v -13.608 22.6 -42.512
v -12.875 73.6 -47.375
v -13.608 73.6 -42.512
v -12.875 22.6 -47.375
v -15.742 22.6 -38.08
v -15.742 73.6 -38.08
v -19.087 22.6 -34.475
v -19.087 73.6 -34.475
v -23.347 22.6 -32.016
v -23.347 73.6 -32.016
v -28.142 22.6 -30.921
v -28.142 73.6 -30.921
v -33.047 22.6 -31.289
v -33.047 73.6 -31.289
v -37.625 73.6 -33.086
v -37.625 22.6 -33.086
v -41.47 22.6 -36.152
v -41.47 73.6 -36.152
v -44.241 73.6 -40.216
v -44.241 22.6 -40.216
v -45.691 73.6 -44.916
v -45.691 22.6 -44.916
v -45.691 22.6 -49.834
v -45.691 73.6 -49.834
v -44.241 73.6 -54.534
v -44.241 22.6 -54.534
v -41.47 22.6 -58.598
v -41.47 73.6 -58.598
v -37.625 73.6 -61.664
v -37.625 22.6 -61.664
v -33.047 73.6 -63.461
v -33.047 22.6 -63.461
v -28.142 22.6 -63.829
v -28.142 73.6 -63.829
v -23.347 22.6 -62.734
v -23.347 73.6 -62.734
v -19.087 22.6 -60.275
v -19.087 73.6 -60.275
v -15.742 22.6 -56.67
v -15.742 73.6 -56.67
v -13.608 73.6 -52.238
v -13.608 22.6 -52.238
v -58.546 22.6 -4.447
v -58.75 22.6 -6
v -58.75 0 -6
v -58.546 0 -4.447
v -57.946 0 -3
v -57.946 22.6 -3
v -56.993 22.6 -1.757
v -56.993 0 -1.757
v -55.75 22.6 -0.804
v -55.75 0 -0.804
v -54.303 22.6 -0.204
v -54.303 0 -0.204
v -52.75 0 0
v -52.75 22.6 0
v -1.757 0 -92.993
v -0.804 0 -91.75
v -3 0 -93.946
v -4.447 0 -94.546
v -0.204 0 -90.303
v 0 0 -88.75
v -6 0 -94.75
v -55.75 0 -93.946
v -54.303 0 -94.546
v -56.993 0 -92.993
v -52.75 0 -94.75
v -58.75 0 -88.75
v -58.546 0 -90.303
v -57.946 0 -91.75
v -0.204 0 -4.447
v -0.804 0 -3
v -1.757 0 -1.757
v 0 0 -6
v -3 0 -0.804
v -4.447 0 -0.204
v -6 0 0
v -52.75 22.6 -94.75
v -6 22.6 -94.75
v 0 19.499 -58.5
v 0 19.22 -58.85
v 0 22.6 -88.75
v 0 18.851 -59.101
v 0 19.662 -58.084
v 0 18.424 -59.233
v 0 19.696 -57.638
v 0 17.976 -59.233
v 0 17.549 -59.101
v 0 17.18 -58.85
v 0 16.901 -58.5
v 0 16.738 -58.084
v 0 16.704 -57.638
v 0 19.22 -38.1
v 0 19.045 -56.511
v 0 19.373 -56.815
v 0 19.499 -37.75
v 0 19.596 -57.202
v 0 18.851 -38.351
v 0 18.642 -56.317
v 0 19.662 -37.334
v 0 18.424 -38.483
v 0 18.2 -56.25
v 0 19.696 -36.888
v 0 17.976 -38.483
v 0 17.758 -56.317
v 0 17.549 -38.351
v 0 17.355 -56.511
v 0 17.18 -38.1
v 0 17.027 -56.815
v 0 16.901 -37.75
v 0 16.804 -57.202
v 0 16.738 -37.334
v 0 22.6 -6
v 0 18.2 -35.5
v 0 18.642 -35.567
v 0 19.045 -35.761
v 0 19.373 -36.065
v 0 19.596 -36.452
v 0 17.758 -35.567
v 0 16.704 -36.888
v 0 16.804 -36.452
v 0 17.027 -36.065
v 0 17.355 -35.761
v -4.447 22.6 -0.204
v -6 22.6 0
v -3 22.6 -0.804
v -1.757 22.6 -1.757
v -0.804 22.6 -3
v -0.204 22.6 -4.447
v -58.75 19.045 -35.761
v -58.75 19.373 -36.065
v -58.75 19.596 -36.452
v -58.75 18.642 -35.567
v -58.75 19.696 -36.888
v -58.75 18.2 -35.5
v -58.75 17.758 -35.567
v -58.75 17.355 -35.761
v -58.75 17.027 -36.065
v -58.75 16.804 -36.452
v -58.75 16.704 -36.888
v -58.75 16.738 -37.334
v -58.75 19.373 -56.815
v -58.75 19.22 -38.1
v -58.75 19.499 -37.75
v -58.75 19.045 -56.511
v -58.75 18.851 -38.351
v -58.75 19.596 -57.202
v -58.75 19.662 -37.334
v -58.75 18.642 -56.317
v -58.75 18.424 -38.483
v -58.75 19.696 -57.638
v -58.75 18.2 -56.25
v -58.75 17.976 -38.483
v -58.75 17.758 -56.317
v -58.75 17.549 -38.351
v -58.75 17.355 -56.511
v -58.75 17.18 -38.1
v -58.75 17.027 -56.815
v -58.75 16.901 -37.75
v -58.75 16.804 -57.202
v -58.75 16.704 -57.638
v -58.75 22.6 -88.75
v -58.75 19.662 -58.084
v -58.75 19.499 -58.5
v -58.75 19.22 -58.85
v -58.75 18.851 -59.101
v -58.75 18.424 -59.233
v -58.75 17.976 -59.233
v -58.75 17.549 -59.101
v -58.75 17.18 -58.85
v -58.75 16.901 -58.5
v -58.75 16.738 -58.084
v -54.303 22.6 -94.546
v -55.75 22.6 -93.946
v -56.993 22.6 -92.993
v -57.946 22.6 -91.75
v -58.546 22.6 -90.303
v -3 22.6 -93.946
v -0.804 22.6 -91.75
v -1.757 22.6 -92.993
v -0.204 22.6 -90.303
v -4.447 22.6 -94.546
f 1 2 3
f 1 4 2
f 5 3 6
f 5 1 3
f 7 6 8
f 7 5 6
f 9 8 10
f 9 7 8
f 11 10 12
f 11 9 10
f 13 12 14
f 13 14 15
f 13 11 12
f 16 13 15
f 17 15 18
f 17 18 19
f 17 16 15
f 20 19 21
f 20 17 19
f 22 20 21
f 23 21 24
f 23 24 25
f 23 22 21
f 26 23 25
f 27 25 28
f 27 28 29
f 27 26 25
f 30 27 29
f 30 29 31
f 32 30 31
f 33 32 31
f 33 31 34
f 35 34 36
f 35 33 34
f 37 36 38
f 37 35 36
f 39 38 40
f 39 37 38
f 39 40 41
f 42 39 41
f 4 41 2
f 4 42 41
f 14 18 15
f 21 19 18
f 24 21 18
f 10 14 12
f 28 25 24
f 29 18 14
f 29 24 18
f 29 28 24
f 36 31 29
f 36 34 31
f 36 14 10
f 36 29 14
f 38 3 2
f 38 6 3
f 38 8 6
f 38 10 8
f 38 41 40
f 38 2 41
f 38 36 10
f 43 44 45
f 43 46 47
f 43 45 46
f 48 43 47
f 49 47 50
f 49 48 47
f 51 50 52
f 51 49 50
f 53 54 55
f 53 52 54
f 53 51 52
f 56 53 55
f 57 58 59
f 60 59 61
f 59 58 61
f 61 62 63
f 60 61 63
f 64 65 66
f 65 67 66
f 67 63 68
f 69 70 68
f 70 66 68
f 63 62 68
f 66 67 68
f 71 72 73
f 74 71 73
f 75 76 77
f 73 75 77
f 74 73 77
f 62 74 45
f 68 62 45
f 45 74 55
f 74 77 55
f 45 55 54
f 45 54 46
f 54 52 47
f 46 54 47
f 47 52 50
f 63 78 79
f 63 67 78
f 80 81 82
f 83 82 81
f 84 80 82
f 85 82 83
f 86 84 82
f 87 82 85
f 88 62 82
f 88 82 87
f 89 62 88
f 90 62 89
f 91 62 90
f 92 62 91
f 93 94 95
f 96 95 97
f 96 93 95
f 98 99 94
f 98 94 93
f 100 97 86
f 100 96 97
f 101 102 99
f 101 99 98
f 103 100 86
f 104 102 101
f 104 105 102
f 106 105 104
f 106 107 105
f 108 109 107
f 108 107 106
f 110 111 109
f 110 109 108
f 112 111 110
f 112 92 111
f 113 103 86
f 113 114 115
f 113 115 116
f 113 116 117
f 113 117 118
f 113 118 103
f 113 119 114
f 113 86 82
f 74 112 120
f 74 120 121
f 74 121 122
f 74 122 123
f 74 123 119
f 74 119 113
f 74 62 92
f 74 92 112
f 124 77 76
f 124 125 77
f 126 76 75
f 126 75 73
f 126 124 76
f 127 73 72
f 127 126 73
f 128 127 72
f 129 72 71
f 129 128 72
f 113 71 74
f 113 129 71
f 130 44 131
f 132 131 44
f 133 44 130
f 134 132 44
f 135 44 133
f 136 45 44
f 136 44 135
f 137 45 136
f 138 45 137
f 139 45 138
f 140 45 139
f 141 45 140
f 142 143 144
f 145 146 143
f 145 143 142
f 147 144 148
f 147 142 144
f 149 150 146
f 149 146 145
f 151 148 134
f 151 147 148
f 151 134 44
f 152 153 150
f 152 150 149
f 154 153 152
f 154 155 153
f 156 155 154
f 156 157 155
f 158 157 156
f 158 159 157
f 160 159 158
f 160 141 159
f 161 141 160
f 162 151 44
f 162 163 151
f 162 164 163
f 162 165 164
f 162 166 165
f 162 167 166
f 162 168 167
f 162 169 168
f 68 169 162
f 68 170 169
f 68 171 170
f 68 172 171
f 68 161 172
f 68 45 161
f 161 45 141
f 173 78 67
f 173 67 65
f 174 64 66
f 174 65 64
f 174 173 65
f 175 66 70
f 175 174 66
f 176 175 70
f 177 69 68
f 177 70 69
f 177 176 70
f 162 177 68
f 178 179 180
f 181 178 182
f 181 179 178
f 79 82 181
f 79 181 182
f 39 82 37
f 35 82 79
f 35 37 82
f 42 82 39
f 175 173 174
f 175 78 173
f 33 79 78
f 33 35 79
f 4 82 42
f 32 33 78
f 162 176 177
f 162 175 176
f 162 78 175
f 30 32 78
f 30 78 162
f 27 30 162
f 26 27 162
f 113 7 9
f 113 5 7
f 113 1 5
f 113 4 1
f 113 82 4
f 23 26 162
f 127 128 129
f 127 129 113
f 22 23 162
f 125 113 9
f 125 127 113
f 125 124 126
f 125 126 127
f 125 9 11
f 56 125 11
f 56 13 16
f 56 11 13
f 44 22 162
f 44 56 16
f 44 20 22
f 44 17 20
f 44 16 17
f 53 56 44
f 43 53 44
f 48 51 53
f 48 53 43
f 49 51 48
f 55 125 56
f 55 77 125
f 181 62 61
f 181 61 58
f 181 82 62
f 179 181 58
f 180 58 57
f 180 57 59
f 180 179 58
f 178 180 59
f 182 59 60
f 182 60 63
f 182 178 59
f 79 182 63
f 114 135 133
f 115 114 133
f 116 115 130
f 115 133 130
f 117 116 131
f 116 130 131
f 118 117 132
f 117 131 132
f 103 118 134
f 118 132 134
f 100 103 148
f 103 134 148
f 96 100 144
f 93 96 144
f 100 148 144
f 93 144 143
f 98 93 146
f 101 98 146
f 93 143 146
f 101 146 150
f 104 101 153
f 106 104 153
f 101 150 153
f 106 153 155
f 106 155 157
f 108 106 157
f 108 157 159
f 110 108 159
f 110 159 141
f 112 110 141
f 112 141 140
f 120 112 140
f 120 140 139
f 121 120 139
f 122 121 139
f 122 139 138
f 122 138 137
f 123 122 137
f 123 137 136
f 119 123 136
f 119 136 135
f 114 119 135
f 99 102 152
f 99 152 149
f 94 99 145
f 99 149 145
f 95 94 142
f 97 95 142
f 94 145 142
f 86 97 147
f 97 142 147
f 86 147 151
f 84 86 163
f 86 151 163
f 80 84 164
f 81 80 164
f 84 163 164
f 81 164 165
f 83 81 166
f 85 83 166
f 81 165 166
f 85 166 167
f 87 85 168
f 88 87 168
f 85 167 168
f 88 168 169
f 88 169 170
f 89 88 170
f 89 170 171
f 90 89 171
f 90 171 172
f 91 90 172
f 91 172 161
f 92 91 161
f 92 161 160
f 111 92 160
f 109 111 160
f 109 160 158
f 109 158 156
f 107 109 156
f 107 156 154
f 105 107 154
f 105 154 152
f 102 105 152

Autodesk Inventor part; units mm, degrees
ref_plane "YZ Plane" through (0, 0, 0) normal (1, 0, 0) x (0, 1, 0)
ref_plane "XZ Plane" through (0, 0, 0) normal (0, 1, 0) x (-1, 0, 0)
ref_plane "XY Plane" through (0, 0, 0) normal (0, 0, 1) x (1, 0, 0)
sketch "Sketch1" plane through (0, 0, 0) normal (0, 1, 0) x (-1, 0, 0)
  line L0 (0, 0) -> (58.75, 0)
  line L1 (58.75, 0) -> (58.75, -94.75)
  line L2 (58.75, -94.75) -> (0, -94.75)
  line L3 (0, -94.75) -> (0, 0)
  dimension "d0" = 58.75
  dimension "d1" = 94.75
extrude "Extrusion1" add sketch "Sketch1" along normal blind 22.6
sketch "Sketch2" plane through (0, 22.6, 0) normal (0, 1, 0) x (1, 0, 0)
  line L0 (-58.75, 0) -> (0, 0) projected
  line L1 (-29.375, 0) -> (-29.375, 94.75)
  line L2 (0, 94.75) -> (-58.75, 94.75) projected
  line L3 (-58.75, 94.75) -> (-58.75, 0) projected
  line L4 (-58.75, 47.375) -> (0, 47.375)
  line L5 (0, 0) -> (0, 94.75) projected
  circle A0 centre (-29.375, 47.375) radius 16.5
  dimension "d4" = 33
extrude "Extrusion2" add sketch "Sketch2" along normal blind 51 contours A0 L4 L1 | L1 L4 A0 | A0 L1 L4 | L1 A0 L4
fillet "Fillet1" radius 6 4 edges at (0, 11.3, 0) (0, 11.3, -94.75) (-58.75, 11.3, 0) (-58.75, 11.3, -94.75)
sketch "Sketch3" plane through (-58.75, 0, -88.75) normal (-1, 0, 0) x (0, 0, 1)
  line L0 (82.75, 22.6) -> (88.75, 22.6) projected
  line L1 (88.75, 22.6) -> (51.75, 22.6)
  line L2 (24.875, 22.6) -> (57.875, 22.6) projected
  line L3 (51.75, 22.6) -> (51.75, 18.2)
  circle A0 centre (51.75, 18.2) radius 1.5
  line L4 (41.375, 22.6) -> (41.375, 4.2655)
  circle A1 centre (31, 18.2) radius 1.5
  point P0 (88.75, 0)
  dimension "d8" = 37
  dimension "d9" = 4.4
  dimension "d10" = 3
extrude "Extrusion3" cut sketch "Sketch3" against normal blind 70
properties part number "camera_v2"
